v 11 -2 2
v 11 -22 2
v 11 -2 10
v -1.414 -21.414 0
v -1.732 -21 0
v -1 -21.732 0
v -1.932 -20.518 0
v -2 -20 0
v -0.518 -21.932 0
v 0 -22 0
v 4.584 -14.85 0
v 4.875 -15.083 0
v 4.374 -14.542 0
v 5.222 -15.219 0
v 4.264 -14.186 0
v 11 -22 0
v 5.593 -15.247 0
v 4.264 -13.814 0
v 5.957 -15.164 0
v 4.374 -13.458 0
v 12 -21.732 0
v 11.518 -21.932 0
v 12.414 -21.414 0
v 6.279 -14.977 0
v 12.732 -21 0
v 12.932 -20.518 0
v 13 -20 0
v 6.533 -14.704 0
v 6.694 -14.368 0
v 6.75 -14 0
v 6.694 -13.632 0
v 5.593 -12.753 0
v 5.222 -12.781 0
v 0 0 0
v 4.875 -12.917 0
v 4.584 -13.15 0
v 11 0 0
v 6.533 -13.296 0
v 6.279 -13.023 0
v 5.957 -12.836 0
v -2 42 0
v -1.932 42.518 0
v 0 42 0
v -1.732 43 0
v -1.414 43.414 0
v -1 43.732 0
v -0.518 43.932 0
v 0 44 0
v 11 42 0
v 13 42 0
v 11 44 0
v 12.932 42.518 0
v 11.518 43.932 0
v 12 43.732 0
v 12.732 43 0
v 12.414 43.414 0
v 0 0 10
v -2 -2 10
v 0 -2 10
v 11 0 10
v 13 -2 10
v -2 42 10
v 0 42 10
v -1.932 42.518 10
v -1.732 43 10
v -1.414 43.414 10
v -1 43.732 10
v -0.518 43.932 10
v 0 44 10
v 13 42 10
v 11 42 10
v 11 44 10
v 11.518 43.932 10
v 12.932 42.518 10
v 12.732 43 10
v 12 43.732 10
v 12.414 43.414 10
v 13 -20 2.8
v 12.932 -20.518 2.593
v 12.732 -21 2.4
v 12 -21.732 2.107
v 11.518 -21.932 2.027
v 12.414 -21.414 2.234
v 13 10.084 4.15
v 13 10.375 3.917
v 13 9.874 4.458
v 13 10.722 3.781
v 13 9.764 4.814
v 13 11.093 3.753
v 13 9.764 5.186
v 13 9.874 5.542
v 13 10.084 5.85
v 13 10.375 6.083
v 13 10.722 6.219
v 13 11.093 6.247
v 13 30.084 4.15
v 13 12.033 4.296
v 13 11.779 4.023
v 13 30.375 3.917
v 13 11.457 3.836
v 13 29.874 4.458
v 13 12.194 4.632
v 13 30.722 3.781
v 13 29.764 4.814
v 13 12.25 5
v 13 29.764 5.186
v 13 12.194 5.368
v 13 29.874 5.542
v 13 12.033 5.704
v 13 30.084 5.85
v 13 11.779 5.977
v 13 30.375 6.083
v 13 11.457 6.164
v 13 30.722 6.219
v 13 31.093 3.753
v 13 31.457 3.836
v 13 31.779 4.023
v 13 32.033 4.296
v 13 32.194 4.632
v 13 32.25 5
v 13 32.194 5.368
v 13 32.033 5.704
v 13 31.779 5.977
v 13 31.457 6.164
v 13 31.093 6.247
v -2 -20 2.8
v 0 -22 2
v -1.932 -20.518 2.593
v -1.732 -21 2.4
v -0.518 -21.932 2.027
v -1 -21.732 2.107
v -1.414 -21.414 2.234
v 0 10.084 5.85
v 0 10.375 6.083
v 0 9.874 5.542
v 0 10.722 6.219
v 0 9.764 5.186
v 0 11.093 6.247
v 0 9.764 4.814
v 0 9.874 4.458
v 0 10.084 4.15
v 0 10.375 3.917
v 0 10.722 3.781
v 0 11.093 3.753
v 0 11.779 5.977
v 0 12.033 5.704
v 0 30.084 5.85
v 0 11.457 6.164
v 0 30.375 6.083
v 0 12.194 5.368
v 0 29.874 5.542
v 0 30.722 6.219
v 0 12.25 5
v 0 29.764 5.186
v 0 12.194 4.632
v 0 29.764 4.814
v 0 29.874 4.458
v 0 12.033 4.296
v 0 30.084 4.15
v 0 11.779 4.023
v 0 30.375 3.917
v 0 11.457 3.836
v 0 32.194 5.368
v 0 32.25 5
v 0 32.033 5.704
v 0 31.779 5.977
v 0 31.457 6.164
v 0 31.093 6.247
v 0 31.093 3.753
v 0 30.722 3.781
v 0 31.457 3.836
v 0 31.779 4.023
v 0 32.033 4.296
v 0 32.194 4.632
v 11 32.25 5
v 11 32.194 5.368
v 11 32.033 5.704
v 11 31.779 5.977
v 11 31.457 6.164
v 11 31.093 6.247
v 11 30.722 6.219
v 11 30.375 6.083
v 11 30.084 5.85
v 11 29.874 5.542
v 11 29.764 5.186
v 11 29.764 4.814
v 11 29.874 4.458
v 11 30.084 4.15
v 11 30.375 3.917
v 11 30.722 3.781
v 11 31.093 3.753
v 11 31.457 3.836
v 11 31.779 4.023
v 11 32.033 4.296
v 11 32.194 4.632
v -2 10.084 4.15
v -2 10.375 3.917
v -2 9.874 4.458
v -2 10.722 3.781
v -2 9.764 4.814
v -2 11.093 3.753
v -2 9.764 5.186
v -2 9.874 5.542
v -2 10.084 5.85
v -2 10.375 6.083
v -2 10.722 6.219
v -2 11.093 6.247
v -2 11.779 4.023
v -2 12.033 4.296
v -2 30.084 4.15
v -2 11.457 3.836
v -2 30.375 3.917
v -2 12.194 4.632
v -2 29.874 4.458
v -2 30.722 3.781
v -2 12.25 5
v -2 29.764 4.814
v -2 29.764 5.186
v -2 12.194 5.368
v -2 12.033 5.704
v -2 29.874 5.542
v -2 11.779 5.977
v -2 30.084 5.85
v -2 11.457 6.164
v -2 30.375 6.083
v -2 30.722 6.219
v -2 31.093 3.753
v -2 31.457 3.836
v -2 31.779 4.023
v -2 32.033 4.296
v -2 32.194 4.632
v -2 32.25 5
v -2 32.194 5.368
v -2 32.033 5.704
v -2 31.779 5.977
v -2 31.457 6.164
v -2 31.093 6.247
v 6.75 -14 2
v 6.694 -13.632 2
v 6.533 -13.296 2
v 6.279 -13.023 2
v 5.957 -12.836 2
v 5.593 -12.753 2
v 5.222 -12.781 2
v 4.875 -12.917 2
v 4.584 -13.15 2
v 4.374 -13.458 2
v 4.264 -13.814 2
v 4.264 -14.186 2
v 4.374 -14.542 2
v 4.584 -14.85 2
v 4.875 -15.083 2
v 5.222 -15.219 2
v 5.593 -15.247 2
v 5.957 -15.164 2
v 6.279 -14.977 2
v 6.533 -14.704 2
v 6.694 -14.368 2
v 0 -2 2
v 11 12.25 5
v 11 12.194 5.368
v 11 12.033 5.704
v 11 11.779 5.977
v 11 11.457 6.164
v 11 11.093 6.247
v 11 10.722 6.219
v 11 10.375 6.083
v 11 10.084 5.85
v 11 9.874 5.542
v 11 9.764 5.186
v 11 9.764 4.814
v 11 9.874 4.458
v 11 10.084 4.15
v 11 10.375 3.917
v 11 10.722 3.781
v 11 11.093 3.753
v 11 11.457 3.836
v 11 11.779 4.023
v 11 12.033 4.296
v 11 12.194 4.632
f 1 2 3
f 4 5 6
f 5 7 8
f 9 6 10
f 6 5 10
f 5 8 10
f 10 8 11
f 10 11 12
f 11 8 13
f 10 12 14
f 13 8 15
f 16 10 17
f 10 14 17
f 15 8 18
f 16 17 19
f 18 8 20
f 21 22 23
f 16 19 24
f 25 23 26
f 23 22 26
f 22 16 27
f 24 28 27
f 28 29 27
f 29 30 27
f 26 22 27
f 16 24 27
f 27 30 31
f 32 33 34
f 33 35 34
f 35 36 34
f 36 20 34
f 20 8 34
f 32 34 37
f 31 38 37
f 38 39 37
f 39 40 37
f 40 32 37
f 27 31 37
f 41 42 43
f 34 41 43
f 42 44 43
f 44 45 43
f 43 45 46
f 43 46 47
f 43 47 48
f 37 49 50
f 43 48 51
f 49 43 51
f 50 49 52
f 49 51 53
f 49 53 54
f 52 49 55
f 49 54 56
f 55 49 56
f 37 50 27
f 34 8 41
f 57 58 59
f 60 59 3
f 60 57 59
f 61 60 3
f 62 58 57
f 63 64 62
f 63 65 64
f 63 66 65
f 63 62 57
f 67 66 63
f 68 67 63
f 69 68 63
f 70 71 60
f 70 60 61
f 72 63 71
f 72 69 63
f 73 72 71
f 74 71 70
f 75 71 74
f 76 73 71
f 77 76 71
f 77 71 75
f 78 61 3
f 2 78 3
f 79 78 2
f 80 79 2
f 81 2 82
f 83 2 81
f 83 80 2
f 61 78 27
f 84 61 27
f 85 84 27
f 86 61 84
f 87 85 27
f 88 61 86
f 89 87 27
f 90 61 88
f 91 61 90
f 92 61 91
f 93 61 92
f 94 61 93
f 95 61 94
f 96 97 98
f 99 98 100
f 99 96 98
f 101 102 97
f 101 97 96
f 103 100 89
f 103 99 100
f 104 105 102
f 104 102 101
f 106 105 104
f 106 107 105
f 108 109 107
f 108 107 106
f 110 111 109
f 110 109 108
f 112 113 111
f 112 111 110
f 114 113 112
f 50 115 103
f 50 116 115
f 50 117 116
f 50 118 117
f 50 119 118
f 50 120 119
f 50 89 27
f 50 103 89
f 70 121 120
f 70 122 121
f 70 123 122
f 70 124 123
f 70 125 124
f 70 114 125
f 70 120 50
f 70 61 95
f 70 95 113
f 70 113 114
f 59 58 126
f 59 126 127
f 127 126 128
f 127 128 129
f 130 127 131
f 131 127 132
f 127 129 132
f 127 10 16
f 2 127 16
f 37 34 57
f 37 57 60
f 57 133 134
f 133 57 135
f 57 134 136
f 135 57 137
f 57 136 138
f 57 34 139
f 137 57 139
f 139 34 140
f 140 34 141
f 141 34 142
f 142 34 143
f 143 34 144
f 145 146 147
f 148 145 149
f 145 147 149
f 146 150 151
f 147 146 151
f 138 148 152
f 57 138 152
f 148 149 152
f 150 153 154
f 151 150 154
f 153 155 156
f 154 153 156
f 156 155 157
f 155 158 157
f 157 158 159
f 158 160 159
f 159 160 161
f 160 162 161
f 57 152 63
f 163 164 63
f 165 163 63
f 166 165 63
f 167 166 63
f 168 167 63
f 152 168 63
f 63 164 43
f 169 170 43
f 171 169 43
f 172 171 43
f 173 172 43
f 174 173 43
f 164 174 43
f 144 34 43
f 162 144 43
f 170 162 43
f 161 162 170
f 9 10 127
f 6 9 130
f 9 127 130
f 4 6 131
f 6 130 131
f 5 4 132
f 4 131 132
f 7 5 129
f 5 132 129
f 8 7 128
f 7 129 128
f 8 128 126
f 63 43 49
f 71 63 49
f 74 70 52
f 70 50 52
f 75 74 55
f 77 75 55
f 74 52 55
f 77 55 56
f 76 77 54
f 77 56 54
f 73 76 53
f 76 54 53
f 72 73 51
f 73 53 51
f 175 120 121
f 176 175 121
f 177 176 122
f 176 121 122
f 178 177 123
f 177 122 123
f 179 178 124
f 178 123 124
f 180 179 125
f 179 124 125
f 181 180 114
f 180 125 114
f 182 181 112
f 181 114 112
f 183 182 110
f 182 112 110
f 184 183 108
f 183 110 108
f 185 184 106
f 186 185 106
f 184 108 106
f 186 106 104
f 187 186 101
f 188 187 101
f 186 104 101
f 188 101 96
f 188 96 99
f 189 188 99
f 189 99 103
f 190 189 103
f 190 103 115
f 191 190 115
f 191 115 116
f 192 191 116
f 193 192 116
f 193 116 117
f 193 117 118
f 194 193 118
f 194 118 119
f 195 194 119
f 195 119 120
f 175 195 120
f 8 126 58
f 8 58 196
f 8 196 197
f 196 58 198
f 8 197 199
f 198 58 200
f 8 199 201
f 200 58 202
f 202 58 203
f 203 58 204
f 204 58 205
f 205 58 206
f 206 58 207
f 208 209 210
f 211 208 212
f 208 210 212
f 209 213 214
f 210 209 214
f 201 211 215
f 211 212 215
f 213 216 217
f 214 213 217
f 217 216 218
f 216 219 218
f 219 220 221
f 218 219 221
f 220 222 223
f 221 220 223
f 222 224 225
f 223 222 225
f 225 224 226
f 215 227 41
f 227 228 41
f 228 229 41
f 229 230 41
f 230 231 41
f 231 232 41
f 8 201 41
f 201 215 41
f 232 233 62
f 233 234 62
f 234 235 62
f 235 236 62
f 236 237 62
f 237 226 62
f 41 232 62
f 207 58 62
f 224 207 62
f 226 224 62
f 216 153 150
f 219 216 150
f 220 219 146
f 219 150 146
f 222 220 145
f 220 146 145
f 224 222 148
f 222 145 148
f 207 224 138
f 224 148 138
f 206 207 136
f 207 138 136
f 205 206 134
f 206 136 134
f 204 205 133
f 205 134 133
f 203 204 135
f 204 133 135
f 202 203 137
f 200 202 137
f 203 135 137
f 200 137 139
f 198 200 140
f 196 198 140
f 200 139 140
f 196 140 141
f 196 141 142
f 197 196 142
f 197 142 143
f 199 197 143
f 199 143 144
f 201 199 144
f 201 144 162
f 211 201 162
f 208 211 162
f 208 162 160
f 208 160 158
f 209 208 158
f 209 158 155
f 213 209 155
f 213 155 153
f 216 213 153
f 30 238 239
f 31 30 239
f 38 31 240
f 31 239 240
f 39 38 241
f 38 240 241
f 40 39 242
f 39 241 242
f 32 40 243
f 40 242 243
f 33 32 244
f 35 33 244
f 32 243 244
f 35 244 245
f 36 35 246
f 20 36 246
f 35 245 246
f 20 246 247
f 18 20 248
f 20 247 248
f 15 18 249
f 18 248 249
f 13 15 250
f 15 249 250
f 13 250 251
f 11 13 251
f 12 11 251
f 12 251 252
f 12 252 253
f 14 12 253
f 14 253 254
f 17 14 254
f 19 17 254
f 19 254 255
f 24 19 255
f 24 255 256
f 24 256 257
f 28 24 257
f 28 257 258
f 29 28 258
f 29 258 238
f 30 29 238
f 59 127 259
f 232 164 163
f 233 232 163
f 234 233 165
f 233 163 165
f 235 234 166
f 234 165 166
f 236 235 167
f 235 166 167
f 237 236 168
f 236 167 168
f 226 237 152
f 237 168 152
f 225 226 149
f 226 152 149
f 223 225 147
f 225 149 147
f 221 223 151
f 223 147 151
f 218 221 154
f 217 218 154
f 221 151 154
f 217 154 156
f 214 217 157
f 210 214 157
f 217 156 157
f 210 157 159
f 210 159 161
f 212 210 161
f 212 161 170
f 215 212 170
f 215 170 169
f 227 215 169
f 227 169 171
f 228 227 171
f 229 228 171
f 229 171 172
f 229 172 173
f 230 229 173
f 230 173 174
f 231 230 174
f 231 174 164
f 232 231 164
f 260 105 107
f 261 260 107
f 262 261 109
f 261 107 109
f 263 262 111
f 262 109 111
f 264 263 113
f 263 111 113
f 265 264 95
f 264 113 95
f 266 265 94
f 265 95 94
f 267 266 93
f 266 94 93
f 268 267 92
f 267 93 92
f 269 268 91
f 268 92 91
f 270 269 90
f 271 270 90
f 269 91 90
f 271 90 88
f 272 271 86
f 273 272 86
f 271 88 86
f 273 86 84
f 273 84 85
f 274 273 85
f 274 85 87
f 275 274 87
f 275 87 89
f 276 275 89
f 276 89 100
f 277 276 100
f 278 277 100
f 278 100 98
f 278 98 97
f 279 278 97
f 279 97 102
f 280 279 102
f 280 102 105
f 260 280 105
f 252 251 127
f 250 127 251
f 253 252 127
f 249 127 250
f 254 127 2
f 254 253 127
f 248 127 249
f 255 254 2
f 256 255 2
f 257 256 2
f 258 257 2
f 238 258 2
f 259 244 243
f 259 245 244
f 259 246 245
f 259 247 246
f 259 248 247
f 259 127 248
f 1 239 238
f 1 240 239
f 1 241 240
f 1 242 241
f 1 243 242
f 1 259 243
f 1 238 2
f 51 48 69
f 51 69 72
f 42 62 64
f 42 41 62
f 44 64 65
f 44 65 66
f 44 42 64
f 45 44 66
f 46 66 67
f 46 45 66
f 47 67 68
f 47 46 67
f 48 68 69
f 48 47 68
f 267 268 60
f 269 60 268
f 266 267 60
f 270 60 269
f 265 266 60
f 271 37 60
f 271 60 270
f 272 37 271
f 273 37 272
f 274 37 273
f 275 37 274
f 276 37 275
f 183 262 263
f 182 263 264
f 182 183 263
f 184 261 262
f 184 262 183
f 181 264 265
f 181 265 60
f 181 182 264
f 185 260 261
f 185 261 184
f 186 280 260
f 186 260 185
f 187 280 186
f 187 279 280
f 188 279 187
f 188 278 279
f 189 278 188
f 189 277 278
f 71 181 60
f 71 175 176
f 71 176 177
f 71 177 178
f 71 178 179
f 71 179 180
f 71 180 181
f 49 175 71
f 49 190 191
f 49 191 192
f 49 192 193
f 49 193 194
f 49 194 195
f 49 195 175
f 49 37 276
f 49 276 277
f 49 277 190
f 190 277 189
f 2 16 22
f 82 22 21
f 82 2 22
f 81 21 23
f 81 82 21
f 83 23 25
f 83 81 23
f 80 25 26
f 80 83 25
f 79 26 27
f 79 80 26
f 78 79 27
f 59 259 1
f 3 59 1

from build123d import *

# Parameters (mm, degrees)
F0_W      = 11
F0_H      = 42
F1_DEPTH  = 10
F2_T      = 2
F3_W      = 15
F3_H      = 20
F4_DEPTH  = 2
F6_DEPTH  = 2
F8_R      = 1.25
F9_DEPTH  = 2.001
F10_R     = 1.25
F11_DEPTH = 15.001
F12_R     = 2


# Not quite as in the source:
# - a pattern or mirror of a feature is missing from the dataset's text; its kind, count and spacing are read off the source's solid


with BuildPart() as f1:
    # F0 (on Top) → F1 (new body)
    with BuildSketch(Plane.XY):
        with Locations((5.5, 21)):
            Rectangle(F0_W, F0_H)
    extrude(amount=F1_DEPTH)

    # F2
    f2_openings = [f1.faces().sort_by_distance(p)[0] for p in [
        (5.5, 21, 10),
        (5.5, 21, 0),
    ]]
    offset(amount=F2_T, openings=f2_openings, kind=Kind.INTERSECTION)

    # F3 (on Top) → F4 (join)
    with BuildSketch(Plane.XY):
        with Locations((5.5, -12)):
            Rectangle(F3_W, F3_H)
    extrude(amount=F4_DEPTH)

    # F5 (on face) → F6 (join)
    with BuildSketch(Plane.YZ.offset(13)):
        Polygon((-2, 10), (-22, 2), (-2, 2), align=None)
    f6 = extrude(amount=-F6_DEPTH)

    # F6_copies: F6 across plane
    add(f6.mirror(Plane(origin=(5.5, 0, 0), x_dir=(0, 0, -1), z_dir=(-1, 0, 0))))

    # F8 (on face) → F9 (cut, through all)
    with BuildSketch(Plane.XY.offset(2)):
        with Locations((5.5, -14)):
            Circle(F8_R)
    extrude(amount=-F9_DEPTH, mode=Mode.SUBTRACT)

    # F10 (on face) → F11 (cut, through all)
    with BuildSketch(Plane.YZ.offset(13)):
        with Locations((11, 5)):
            Circle(F10_R)
        with Locations((31, 5)):
            Circle(F10_R)
    extrude(amount=-F11_DEPTH, mode=Mode.SUBTRACT)

    # F12
    f12_edges = [f1.edges().sort_by_distance(p)[0] for p in [
        (-2, -22, 1),
        (13, -22, 1),
        (13, 44, 5),
        (-2, 44, 5),
    ]]
    fillet(f12_edges, radius=F12_R)


solid = f1.part
